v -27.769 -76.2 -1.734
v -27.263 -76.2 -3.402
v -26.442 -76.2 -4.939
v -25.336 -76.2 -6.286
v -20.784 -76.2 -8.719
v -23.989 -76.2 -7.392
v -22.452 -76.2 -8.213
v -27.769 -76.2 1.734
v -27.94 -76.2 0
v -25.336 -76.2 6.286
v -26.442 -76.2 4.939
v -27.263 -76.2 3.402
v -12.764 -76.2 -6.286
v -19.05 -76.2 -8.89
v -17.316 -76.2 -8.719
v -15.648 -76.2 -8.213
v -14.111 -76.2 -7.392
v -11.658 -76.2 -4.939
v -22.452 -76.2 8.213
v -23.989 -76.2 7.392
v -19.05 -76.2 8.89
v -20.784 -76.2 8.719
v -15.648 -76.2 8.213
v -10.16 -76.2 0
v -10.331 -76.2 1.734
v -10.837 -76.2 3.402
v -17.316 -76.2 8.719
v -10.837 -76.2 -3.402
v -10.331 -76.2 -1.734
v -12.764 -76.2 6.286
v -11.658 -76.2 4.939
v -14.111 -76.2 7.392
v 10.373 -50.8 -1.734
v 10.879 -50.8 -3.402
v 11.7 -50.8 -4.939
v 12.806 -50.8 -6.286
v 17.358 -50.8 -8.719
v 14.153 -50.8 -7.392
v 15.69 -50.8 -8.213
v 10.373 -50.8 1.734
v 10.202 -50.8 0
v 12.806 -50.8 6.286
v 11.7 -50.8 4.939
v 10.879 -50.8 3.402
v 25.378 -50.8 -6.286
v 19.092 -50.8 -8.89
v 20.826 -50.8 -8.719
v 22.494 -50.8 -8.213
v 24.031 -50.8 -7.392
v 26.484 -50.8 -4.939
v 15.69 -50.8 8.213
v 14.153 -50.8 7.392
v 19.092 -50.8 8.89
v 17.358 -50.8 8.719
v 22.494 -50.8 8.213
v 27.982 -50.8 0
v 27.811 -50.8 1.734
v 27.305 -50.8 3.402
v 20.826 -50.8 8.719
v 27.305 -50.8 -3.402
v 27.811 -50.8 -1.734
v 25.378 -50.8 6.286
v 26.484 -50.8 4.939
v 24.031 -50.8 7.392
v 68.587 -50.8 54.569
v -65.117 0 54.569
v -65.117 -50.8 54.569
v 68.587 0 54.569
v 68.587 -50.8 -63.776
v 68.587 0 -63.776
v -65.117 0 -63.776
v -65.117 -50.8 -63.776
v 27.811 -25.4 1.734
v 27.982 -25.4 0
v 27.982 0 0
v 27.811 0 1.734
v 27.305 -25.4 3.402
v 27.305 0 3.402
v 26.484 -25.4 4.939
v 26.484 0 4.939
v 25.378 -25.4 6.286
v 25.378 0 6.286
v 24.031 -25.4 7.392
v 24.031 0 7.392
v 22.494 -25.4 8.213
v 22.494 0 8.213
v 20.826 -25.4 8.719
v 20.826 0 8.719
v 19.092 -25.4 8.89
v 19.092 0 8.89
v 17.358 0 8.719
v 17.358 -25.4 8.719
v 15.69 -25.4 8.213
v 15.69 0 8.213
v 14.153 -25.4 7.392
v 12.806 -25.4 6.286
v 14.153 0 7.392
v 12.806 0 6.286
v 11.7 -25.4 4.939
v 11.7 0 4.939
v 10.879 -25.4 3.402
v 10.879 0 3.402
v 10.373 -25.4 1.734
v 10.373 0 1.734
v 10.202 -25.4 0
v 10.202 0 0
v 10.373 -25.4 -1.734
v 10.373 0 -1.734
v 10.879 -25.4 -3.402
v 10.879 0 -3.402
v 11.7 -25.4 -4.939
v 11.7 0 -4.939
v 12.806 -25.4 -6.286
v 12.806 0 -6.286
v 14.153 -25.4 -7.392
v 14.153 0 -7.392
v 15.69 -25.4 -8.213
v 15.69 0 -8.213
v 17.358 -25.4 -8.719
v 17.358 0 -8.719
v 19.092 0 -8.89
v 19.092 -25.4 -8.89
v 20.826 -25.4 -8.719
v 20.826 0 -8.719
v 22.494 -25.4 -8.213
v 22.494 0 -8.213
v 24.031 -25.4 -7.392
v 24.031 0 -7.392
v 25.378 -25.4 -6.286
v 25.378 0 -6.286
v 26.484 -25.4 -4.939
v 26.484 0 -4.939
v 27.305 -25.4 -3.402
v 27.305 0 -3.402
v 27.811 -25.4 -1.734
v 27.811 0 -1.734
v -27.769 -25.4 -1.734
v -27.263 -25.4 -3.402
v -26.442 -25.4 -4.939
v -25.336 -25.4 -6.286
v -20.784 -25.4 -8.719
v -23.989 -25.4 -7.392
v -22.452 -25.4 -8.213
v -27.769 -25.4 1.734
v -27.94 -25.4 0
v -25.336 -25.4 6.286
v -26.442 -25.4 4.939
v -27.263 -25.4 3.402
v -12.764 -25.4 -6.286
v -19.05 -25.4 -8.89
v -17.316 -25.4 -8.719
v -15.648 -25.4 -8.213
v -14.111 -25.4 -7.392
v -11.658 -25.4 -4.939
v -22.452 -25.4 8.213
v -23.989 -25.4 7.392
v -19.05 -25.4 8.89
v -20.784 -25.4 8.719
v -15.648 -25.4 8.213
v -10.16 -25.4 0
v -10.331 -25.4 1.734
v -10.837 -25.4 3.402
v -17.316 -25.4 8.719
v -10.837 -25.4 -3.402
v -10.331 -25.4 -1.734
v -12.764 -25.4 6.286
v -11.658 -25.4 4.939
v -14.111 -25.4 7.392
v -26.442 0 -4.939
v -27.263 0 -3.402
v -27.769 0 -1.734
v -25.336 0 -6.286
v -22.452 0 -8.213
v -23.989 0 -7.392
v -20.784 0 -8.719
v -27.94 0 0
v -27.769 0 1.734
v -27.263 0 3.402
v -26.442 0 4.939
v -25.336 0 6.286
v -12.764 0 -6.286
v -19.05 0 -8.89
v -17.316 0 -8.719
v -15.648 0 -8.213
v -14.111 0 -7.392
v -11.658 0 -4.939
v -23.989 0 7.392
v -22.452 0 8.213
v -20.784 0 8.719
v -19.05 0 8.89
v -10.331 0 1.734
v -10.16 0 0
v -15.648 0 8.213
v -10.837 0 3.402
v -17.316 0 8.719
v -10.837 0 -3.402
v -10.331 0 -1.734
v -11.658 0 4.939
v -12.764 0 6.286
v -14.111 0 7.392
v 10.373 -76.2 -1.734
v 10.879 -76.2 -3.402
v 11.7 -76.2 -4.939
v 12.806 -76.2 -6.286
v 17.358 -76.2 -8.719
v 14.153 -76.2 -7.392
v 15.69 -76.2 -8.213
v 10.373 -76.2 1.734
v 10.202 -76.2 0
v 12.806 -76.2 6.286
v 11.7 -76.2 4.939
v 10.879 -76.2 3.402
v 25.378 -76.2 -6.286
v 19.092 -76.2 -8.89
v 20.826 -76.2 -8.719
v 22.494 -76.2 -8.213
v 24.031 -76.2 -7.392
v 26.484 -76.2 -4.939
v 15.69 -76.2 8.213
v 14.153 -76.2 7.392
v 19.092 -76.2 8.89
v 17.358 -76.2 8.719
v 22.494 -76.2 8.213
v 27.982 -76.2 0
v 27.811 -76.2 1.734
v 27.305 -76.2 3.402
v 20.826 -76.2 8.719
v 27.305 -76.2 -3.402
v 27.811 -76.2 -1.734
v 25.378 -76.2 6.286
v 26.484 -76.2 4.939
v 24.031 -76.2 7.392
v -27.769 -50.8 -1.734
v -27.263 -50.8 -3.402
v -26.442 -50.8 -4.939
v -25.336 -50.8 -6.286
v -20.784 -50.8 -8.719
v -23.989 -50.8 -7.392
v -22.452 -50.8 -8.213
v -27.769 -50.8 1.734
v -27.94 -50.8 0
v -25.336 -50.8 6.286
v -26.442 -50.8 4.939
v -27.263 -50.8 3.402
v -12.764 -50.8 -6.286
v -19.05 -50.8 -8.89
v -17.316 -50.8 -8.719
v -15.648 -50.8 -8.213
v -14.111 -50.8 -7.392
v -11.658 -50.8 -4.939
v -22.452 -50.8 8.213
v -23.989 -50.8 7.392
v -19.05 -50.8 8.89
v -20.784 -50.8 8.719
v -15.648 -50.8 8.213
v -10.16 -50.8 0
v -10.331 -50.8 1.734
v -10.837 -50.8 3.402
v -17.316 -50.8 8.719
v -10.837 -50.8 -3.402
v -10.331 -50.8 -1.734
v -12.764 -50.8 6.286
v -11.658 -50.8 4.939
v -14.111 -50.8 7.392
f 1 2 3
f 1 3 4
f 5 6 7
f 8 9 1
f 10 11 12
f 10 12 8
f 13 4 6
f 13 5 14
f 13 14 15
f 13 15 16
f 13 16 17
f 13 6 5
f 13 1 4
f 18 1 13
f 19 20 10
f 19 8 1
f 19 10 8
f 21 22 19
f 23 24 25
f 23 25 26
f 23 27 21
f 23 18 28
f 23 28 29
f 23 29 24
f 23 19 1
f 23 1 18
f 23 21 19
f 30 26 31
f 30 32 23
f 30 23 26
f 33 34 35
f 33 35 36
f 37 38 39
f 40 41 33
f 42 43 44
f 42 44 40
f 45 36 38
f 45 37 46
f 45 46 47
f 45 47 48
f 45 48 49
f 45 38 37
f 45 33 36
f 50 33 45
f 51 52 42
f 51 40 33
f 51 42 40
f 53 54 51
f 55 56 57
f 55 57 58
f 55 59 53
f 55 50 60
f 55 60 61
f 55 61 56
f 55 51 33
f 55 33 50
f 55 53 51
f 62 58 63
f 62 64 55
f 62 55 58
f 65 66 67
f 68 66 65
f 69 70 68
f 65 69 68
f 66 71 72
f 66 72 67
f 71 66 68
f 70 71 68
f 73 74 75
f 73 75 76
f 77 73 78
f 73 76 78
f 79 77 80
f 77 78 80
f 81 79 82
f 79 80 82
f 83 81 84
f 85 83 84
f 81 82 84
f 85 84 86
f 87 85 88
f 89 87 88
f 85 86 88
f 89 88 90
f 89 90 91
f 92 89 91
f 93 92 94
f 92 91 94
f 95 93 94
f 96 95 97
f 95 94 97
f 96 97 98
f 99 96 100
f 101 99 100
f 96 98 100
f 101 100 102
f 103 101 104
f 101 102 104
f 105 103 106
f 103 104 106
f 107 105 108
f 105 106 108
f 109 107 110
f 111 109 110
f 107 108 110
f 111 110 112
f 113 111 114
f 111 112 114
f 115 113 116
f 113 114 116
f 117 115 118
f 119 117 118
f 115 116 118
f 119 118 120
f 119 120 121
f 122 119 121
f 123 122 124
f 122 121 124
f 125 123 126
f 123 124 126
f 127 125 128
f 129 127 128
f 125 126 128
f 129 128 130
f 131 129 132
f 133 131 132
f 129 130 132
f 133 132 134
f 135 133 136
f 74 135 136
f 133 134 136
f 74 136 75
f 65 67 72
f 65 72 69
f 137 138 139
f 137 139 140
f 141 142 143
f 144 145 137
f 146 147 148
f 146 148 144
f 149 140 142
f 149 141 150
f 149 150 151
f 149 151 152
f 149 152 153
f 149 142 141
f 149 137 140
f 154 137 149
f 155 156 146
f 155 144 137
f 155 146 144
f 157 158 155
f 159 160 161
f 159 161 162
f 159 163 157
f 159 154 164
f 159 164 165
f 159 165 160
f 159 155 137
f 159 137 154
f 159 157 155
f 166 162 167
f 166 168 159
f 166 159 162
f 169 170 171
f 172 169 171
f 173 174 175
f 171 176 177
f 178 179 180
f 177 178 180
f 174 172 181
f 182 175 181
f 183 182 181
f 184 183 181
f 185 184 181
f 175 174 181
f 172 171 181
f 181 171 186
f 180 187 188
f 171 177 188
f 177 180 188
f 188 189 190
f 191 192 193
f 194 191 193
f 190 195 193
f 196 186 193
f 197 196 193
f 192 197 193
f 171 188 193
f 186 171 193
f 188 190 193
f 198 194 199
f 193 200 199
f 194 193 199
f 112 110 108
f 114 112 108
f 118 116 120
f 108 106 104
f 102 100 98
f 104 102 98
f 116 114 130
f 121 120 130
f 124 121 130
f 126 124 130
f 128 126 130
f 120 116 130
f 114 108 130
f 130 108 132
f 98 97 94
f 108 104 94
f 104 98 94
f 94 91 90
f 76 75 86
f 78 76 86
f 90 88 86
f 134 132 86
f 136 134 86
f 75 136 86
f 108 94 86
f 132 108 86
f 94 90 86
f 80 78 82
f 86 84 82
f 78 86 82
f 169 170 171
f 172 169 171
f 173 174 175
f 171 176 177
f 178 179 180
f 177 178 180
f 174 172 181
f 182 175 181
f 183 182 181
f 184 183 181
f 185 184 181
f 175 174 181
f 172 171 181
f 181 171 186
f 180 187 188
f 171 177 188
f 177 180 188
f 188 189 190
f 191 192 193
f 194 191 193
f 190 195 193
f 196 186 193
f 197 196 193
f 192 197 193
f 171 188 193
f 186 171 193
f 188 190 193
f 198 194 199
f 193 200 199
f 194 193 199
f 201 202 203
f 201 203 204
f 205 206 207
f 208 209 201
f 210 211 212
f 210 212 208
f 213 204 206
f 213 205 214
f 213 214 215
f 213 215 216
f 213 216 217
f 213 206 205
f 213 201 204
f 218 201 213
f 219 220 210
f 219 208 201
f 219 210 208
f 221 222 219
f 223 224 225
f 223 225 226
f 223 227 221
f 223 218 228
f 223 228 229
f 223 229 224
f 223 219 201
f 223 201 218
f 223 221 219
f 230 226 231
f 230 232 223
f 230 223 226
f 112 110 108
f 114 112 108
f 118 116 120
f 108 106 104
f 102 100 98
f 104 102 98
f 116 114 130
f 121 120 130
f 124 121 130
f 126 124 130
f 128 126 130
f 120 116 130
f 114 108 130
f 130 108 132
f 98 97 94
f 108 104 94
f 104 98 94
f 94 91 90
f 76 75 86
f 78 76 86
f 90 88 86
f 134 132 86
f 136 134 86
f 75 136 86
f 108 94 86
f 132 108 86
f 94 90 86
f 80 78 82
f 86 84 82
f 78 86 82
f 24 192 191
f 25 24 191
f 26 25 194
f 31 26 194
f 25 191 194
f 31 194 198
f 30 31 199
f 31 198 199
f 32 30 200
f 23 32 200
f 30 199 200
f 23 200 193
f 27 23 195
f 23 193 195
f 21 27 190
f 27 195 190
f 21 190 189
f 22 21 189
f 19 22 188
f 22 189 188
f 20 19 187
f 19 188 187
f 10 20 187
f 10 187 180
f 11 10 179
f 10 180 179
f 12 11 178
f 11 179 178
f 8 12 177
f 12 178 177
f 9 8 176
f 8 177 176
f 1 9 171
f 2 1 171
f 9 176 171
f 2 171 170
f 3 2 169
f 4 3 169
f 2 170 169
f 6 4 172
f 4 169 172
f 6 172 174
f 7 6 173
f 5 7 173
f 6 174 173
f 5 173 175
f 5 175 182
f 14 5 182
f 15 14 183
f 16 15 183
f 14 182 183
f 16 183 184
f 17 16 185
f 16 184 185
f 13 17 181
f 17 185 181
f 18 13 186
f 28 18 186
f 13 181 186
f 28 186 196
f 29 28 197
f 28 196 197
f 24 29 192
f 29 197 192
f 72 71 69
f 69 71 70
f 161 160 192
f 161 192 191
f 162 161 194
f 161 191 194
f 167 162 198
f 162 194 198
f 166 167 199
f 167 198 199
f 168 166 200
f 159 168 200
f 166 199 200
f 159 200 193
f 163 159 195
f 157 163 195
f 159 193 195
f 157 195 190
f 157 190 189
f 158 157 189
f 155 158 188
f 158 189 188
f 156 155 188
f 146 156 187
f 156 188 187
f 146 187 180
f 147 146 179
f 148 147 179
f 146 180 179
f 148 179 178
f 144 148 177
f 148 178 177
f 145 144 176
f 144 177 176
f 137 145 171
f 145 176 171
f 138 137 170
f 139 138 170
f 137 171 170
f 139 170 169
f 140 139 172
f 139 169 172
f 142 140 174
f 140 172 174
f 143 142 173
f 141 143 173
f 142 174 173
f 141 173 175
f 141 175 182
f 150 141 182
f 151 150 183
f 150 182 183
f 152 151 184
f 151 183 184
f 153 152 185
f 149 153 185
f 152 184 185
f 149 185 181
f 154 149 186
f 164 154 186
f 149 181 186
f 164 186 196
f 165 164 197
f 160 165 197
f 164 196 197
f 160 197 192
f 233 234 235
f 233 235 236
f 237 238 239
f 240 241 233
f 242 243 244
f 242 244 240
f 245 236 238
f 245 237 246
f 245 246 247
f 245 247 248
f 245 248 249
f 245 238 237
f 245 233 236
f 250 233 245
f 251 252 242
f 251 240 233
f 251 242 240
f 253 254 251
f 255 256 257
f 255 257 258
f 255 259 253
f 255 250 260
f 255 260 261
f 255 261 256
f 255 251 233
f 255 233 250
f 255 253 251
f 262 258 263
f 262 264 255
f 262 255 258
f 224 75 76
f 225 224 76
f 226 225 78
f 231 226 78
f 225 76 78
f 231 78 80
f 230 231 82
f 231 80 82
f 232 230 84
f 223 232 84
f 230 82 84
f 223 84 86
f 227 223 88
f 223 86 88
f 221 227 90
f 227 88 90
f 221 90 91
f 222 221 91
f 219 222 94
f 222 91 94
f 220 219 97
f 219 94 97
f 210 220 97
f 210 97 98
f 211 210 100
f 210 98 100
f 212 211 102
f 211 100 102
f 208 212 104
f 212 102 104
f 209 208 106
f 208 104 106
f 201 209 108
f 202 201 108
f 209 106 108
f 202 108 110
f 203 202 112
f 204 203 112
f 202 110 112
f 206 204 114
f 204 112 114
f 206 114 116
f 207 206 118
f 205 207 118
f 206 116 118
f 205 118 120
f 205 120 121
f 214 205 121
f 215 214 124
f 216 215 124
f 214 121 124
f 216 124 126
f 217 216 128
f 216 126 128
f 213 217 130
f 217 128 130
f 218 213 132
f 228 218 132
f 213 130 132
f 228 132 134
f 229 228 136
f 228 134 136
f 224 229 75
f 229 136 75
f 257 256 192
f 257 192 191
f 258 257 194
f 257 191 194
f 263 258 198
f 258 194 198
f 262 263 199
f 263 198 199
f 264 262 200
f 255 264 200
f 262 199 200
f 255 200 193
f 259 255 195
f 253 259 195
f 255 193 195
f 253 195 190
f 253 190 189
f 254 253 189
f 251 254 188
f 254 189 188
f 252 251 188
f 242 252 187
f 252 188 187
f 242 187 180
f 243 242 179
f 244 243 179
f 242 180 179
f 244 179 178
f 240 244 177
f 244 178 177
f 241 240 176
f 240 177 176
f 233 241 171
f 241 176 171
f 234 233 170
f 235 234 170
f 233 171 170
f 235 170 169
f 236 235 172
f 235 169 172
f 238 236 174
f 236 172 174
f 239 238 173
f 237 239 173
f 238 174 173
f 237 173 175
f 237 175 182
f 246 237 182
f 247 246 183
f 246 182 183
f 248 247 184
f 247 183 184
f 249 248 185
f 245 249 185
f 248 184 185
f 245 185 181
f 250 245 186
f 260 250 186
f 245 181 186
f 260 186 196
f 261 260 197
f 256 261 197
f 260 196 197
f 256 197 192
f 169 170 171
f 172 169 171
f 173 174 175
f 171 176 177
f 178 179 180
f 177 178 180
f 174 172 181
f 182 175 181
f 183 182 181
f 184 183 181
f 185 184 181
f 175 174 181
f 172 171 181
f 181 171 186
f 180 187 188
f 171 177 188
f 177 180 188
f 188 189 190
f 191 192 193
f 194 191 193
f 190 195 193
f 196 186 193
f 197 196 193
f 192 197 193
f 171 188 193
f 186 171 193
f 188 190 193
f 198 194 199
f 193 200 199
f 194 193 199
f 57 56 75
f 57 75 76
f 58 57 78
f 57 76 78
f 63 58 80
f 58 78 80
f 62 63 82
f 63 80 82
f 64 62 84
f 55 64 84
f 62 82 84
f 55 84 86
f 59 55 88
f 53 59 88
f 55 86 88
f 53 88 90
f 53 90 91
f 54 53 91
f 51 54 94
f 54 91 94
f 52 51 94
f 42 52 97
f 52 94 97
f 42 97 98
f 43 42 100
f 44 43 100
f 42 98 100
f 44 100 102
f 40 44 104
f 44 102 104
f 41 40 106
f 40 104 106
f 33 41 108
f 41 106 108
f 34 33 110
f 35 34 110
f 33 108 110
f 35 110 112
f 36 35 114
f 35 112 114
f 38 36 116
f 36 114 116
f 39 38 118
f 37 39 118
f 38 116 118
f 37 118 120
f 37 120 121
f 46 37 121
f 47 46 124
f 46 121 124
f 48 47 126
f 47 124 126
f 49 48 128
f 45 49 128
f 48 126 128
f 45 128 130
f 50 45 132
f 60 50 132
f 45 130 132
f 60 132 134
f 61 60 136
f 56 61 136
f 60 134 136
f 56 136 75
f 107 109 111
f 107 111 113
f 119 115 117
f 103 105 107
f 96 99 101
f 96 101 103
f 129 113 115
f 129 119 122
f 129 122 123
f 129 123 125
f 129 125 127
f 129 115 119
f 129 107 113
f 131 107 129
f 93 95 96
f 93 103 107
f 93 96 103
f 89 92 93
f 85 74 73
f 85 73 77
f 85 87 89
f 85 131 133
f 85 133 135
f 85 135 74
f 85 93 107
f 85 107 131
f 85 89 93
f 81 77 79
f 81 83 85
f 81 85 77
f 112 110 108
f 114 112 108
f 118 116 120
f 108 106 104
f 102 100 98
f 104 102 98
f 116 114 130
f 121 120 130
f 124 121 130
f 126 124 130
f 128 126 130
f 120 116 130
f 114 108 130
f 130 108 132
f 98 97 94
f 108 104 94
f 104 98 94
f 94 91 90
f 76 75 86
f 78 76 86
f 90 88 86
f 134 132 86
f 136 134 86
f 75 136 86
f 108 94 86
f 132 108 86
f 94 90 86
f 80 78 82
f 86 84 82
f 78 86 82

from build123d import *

# Parameters (mm, degrees)
F1_R     = 8.89
F2_DEPTH = 50.8
F0_W     = 133.7045803666
F0_H     = 118.3452904224
F3_DEPTH = 25.4
F4_DEPTH = 76.2


with BuildPart() as f2:
    # F1 (on face) → F2 (new body)
    with BuildSketch(Plane.XZ):
        with Locations((-19.05, 0)):
            Circle(F1_R)
    extrude(amount=F2_DEPTH)


with BuildPart() as f2b:
    # F1 (on face) → F2, piece 2 (new body)
    with BuildSketch(Plane.XZ):
        with Locations((19.0921034532, 0)):
            Circle(F1_R)
    extrude(amount=F2_DEPTH)


with BuildPart() as f2c:
    # F0 (on Front) → F2, piece 3 (new body)
    with BuildSketch(Plane.XZ):
        with Locations((1.7349161208, -4.6034231782)):
            Rectangle(F0_W, F0_H)
    extrude(amount=F2_DEPTH)


with BuildPart() as f3:
    # F1 (on face) → F3 (new body)
    with BuildSketch(Plane.XZ):
        with Locations((-19.05, 0)):
            Circle(F1_R)
    extrude(amount=F3_DEPTH)


with BuildPart() as f3b:
    # F1 (on face) → F3, piece 2 (new body)
    with BuildSketch(Plane.XZ):
        with Locations((19.0921034532, 0)):
            Circle(F1_R)
    extrude(amount=F3_DEPTH)


with BuildPart() as f4:
    # F1 (on face) → F4 (new body)
    with BuildSketch(Plane.XZ):
        with Locations((-19.05, 0)):
            Circle(F1_R)
    extrude(amount=F4_DEPTH)


with BuildPart() as f4b:
    # F1 (on face) → F4, piece 2 (new body)
    with BuildSketch(Plane.XZ):
        with Locations((19.0921034532, 0)):
            Circle(F1_R)
    extrude(amount=F4_DEPTH)


solid = Compound([f2.part, f2b.part, f2c.part, f3.part, f3b.part, f4.part, f4b.part])
